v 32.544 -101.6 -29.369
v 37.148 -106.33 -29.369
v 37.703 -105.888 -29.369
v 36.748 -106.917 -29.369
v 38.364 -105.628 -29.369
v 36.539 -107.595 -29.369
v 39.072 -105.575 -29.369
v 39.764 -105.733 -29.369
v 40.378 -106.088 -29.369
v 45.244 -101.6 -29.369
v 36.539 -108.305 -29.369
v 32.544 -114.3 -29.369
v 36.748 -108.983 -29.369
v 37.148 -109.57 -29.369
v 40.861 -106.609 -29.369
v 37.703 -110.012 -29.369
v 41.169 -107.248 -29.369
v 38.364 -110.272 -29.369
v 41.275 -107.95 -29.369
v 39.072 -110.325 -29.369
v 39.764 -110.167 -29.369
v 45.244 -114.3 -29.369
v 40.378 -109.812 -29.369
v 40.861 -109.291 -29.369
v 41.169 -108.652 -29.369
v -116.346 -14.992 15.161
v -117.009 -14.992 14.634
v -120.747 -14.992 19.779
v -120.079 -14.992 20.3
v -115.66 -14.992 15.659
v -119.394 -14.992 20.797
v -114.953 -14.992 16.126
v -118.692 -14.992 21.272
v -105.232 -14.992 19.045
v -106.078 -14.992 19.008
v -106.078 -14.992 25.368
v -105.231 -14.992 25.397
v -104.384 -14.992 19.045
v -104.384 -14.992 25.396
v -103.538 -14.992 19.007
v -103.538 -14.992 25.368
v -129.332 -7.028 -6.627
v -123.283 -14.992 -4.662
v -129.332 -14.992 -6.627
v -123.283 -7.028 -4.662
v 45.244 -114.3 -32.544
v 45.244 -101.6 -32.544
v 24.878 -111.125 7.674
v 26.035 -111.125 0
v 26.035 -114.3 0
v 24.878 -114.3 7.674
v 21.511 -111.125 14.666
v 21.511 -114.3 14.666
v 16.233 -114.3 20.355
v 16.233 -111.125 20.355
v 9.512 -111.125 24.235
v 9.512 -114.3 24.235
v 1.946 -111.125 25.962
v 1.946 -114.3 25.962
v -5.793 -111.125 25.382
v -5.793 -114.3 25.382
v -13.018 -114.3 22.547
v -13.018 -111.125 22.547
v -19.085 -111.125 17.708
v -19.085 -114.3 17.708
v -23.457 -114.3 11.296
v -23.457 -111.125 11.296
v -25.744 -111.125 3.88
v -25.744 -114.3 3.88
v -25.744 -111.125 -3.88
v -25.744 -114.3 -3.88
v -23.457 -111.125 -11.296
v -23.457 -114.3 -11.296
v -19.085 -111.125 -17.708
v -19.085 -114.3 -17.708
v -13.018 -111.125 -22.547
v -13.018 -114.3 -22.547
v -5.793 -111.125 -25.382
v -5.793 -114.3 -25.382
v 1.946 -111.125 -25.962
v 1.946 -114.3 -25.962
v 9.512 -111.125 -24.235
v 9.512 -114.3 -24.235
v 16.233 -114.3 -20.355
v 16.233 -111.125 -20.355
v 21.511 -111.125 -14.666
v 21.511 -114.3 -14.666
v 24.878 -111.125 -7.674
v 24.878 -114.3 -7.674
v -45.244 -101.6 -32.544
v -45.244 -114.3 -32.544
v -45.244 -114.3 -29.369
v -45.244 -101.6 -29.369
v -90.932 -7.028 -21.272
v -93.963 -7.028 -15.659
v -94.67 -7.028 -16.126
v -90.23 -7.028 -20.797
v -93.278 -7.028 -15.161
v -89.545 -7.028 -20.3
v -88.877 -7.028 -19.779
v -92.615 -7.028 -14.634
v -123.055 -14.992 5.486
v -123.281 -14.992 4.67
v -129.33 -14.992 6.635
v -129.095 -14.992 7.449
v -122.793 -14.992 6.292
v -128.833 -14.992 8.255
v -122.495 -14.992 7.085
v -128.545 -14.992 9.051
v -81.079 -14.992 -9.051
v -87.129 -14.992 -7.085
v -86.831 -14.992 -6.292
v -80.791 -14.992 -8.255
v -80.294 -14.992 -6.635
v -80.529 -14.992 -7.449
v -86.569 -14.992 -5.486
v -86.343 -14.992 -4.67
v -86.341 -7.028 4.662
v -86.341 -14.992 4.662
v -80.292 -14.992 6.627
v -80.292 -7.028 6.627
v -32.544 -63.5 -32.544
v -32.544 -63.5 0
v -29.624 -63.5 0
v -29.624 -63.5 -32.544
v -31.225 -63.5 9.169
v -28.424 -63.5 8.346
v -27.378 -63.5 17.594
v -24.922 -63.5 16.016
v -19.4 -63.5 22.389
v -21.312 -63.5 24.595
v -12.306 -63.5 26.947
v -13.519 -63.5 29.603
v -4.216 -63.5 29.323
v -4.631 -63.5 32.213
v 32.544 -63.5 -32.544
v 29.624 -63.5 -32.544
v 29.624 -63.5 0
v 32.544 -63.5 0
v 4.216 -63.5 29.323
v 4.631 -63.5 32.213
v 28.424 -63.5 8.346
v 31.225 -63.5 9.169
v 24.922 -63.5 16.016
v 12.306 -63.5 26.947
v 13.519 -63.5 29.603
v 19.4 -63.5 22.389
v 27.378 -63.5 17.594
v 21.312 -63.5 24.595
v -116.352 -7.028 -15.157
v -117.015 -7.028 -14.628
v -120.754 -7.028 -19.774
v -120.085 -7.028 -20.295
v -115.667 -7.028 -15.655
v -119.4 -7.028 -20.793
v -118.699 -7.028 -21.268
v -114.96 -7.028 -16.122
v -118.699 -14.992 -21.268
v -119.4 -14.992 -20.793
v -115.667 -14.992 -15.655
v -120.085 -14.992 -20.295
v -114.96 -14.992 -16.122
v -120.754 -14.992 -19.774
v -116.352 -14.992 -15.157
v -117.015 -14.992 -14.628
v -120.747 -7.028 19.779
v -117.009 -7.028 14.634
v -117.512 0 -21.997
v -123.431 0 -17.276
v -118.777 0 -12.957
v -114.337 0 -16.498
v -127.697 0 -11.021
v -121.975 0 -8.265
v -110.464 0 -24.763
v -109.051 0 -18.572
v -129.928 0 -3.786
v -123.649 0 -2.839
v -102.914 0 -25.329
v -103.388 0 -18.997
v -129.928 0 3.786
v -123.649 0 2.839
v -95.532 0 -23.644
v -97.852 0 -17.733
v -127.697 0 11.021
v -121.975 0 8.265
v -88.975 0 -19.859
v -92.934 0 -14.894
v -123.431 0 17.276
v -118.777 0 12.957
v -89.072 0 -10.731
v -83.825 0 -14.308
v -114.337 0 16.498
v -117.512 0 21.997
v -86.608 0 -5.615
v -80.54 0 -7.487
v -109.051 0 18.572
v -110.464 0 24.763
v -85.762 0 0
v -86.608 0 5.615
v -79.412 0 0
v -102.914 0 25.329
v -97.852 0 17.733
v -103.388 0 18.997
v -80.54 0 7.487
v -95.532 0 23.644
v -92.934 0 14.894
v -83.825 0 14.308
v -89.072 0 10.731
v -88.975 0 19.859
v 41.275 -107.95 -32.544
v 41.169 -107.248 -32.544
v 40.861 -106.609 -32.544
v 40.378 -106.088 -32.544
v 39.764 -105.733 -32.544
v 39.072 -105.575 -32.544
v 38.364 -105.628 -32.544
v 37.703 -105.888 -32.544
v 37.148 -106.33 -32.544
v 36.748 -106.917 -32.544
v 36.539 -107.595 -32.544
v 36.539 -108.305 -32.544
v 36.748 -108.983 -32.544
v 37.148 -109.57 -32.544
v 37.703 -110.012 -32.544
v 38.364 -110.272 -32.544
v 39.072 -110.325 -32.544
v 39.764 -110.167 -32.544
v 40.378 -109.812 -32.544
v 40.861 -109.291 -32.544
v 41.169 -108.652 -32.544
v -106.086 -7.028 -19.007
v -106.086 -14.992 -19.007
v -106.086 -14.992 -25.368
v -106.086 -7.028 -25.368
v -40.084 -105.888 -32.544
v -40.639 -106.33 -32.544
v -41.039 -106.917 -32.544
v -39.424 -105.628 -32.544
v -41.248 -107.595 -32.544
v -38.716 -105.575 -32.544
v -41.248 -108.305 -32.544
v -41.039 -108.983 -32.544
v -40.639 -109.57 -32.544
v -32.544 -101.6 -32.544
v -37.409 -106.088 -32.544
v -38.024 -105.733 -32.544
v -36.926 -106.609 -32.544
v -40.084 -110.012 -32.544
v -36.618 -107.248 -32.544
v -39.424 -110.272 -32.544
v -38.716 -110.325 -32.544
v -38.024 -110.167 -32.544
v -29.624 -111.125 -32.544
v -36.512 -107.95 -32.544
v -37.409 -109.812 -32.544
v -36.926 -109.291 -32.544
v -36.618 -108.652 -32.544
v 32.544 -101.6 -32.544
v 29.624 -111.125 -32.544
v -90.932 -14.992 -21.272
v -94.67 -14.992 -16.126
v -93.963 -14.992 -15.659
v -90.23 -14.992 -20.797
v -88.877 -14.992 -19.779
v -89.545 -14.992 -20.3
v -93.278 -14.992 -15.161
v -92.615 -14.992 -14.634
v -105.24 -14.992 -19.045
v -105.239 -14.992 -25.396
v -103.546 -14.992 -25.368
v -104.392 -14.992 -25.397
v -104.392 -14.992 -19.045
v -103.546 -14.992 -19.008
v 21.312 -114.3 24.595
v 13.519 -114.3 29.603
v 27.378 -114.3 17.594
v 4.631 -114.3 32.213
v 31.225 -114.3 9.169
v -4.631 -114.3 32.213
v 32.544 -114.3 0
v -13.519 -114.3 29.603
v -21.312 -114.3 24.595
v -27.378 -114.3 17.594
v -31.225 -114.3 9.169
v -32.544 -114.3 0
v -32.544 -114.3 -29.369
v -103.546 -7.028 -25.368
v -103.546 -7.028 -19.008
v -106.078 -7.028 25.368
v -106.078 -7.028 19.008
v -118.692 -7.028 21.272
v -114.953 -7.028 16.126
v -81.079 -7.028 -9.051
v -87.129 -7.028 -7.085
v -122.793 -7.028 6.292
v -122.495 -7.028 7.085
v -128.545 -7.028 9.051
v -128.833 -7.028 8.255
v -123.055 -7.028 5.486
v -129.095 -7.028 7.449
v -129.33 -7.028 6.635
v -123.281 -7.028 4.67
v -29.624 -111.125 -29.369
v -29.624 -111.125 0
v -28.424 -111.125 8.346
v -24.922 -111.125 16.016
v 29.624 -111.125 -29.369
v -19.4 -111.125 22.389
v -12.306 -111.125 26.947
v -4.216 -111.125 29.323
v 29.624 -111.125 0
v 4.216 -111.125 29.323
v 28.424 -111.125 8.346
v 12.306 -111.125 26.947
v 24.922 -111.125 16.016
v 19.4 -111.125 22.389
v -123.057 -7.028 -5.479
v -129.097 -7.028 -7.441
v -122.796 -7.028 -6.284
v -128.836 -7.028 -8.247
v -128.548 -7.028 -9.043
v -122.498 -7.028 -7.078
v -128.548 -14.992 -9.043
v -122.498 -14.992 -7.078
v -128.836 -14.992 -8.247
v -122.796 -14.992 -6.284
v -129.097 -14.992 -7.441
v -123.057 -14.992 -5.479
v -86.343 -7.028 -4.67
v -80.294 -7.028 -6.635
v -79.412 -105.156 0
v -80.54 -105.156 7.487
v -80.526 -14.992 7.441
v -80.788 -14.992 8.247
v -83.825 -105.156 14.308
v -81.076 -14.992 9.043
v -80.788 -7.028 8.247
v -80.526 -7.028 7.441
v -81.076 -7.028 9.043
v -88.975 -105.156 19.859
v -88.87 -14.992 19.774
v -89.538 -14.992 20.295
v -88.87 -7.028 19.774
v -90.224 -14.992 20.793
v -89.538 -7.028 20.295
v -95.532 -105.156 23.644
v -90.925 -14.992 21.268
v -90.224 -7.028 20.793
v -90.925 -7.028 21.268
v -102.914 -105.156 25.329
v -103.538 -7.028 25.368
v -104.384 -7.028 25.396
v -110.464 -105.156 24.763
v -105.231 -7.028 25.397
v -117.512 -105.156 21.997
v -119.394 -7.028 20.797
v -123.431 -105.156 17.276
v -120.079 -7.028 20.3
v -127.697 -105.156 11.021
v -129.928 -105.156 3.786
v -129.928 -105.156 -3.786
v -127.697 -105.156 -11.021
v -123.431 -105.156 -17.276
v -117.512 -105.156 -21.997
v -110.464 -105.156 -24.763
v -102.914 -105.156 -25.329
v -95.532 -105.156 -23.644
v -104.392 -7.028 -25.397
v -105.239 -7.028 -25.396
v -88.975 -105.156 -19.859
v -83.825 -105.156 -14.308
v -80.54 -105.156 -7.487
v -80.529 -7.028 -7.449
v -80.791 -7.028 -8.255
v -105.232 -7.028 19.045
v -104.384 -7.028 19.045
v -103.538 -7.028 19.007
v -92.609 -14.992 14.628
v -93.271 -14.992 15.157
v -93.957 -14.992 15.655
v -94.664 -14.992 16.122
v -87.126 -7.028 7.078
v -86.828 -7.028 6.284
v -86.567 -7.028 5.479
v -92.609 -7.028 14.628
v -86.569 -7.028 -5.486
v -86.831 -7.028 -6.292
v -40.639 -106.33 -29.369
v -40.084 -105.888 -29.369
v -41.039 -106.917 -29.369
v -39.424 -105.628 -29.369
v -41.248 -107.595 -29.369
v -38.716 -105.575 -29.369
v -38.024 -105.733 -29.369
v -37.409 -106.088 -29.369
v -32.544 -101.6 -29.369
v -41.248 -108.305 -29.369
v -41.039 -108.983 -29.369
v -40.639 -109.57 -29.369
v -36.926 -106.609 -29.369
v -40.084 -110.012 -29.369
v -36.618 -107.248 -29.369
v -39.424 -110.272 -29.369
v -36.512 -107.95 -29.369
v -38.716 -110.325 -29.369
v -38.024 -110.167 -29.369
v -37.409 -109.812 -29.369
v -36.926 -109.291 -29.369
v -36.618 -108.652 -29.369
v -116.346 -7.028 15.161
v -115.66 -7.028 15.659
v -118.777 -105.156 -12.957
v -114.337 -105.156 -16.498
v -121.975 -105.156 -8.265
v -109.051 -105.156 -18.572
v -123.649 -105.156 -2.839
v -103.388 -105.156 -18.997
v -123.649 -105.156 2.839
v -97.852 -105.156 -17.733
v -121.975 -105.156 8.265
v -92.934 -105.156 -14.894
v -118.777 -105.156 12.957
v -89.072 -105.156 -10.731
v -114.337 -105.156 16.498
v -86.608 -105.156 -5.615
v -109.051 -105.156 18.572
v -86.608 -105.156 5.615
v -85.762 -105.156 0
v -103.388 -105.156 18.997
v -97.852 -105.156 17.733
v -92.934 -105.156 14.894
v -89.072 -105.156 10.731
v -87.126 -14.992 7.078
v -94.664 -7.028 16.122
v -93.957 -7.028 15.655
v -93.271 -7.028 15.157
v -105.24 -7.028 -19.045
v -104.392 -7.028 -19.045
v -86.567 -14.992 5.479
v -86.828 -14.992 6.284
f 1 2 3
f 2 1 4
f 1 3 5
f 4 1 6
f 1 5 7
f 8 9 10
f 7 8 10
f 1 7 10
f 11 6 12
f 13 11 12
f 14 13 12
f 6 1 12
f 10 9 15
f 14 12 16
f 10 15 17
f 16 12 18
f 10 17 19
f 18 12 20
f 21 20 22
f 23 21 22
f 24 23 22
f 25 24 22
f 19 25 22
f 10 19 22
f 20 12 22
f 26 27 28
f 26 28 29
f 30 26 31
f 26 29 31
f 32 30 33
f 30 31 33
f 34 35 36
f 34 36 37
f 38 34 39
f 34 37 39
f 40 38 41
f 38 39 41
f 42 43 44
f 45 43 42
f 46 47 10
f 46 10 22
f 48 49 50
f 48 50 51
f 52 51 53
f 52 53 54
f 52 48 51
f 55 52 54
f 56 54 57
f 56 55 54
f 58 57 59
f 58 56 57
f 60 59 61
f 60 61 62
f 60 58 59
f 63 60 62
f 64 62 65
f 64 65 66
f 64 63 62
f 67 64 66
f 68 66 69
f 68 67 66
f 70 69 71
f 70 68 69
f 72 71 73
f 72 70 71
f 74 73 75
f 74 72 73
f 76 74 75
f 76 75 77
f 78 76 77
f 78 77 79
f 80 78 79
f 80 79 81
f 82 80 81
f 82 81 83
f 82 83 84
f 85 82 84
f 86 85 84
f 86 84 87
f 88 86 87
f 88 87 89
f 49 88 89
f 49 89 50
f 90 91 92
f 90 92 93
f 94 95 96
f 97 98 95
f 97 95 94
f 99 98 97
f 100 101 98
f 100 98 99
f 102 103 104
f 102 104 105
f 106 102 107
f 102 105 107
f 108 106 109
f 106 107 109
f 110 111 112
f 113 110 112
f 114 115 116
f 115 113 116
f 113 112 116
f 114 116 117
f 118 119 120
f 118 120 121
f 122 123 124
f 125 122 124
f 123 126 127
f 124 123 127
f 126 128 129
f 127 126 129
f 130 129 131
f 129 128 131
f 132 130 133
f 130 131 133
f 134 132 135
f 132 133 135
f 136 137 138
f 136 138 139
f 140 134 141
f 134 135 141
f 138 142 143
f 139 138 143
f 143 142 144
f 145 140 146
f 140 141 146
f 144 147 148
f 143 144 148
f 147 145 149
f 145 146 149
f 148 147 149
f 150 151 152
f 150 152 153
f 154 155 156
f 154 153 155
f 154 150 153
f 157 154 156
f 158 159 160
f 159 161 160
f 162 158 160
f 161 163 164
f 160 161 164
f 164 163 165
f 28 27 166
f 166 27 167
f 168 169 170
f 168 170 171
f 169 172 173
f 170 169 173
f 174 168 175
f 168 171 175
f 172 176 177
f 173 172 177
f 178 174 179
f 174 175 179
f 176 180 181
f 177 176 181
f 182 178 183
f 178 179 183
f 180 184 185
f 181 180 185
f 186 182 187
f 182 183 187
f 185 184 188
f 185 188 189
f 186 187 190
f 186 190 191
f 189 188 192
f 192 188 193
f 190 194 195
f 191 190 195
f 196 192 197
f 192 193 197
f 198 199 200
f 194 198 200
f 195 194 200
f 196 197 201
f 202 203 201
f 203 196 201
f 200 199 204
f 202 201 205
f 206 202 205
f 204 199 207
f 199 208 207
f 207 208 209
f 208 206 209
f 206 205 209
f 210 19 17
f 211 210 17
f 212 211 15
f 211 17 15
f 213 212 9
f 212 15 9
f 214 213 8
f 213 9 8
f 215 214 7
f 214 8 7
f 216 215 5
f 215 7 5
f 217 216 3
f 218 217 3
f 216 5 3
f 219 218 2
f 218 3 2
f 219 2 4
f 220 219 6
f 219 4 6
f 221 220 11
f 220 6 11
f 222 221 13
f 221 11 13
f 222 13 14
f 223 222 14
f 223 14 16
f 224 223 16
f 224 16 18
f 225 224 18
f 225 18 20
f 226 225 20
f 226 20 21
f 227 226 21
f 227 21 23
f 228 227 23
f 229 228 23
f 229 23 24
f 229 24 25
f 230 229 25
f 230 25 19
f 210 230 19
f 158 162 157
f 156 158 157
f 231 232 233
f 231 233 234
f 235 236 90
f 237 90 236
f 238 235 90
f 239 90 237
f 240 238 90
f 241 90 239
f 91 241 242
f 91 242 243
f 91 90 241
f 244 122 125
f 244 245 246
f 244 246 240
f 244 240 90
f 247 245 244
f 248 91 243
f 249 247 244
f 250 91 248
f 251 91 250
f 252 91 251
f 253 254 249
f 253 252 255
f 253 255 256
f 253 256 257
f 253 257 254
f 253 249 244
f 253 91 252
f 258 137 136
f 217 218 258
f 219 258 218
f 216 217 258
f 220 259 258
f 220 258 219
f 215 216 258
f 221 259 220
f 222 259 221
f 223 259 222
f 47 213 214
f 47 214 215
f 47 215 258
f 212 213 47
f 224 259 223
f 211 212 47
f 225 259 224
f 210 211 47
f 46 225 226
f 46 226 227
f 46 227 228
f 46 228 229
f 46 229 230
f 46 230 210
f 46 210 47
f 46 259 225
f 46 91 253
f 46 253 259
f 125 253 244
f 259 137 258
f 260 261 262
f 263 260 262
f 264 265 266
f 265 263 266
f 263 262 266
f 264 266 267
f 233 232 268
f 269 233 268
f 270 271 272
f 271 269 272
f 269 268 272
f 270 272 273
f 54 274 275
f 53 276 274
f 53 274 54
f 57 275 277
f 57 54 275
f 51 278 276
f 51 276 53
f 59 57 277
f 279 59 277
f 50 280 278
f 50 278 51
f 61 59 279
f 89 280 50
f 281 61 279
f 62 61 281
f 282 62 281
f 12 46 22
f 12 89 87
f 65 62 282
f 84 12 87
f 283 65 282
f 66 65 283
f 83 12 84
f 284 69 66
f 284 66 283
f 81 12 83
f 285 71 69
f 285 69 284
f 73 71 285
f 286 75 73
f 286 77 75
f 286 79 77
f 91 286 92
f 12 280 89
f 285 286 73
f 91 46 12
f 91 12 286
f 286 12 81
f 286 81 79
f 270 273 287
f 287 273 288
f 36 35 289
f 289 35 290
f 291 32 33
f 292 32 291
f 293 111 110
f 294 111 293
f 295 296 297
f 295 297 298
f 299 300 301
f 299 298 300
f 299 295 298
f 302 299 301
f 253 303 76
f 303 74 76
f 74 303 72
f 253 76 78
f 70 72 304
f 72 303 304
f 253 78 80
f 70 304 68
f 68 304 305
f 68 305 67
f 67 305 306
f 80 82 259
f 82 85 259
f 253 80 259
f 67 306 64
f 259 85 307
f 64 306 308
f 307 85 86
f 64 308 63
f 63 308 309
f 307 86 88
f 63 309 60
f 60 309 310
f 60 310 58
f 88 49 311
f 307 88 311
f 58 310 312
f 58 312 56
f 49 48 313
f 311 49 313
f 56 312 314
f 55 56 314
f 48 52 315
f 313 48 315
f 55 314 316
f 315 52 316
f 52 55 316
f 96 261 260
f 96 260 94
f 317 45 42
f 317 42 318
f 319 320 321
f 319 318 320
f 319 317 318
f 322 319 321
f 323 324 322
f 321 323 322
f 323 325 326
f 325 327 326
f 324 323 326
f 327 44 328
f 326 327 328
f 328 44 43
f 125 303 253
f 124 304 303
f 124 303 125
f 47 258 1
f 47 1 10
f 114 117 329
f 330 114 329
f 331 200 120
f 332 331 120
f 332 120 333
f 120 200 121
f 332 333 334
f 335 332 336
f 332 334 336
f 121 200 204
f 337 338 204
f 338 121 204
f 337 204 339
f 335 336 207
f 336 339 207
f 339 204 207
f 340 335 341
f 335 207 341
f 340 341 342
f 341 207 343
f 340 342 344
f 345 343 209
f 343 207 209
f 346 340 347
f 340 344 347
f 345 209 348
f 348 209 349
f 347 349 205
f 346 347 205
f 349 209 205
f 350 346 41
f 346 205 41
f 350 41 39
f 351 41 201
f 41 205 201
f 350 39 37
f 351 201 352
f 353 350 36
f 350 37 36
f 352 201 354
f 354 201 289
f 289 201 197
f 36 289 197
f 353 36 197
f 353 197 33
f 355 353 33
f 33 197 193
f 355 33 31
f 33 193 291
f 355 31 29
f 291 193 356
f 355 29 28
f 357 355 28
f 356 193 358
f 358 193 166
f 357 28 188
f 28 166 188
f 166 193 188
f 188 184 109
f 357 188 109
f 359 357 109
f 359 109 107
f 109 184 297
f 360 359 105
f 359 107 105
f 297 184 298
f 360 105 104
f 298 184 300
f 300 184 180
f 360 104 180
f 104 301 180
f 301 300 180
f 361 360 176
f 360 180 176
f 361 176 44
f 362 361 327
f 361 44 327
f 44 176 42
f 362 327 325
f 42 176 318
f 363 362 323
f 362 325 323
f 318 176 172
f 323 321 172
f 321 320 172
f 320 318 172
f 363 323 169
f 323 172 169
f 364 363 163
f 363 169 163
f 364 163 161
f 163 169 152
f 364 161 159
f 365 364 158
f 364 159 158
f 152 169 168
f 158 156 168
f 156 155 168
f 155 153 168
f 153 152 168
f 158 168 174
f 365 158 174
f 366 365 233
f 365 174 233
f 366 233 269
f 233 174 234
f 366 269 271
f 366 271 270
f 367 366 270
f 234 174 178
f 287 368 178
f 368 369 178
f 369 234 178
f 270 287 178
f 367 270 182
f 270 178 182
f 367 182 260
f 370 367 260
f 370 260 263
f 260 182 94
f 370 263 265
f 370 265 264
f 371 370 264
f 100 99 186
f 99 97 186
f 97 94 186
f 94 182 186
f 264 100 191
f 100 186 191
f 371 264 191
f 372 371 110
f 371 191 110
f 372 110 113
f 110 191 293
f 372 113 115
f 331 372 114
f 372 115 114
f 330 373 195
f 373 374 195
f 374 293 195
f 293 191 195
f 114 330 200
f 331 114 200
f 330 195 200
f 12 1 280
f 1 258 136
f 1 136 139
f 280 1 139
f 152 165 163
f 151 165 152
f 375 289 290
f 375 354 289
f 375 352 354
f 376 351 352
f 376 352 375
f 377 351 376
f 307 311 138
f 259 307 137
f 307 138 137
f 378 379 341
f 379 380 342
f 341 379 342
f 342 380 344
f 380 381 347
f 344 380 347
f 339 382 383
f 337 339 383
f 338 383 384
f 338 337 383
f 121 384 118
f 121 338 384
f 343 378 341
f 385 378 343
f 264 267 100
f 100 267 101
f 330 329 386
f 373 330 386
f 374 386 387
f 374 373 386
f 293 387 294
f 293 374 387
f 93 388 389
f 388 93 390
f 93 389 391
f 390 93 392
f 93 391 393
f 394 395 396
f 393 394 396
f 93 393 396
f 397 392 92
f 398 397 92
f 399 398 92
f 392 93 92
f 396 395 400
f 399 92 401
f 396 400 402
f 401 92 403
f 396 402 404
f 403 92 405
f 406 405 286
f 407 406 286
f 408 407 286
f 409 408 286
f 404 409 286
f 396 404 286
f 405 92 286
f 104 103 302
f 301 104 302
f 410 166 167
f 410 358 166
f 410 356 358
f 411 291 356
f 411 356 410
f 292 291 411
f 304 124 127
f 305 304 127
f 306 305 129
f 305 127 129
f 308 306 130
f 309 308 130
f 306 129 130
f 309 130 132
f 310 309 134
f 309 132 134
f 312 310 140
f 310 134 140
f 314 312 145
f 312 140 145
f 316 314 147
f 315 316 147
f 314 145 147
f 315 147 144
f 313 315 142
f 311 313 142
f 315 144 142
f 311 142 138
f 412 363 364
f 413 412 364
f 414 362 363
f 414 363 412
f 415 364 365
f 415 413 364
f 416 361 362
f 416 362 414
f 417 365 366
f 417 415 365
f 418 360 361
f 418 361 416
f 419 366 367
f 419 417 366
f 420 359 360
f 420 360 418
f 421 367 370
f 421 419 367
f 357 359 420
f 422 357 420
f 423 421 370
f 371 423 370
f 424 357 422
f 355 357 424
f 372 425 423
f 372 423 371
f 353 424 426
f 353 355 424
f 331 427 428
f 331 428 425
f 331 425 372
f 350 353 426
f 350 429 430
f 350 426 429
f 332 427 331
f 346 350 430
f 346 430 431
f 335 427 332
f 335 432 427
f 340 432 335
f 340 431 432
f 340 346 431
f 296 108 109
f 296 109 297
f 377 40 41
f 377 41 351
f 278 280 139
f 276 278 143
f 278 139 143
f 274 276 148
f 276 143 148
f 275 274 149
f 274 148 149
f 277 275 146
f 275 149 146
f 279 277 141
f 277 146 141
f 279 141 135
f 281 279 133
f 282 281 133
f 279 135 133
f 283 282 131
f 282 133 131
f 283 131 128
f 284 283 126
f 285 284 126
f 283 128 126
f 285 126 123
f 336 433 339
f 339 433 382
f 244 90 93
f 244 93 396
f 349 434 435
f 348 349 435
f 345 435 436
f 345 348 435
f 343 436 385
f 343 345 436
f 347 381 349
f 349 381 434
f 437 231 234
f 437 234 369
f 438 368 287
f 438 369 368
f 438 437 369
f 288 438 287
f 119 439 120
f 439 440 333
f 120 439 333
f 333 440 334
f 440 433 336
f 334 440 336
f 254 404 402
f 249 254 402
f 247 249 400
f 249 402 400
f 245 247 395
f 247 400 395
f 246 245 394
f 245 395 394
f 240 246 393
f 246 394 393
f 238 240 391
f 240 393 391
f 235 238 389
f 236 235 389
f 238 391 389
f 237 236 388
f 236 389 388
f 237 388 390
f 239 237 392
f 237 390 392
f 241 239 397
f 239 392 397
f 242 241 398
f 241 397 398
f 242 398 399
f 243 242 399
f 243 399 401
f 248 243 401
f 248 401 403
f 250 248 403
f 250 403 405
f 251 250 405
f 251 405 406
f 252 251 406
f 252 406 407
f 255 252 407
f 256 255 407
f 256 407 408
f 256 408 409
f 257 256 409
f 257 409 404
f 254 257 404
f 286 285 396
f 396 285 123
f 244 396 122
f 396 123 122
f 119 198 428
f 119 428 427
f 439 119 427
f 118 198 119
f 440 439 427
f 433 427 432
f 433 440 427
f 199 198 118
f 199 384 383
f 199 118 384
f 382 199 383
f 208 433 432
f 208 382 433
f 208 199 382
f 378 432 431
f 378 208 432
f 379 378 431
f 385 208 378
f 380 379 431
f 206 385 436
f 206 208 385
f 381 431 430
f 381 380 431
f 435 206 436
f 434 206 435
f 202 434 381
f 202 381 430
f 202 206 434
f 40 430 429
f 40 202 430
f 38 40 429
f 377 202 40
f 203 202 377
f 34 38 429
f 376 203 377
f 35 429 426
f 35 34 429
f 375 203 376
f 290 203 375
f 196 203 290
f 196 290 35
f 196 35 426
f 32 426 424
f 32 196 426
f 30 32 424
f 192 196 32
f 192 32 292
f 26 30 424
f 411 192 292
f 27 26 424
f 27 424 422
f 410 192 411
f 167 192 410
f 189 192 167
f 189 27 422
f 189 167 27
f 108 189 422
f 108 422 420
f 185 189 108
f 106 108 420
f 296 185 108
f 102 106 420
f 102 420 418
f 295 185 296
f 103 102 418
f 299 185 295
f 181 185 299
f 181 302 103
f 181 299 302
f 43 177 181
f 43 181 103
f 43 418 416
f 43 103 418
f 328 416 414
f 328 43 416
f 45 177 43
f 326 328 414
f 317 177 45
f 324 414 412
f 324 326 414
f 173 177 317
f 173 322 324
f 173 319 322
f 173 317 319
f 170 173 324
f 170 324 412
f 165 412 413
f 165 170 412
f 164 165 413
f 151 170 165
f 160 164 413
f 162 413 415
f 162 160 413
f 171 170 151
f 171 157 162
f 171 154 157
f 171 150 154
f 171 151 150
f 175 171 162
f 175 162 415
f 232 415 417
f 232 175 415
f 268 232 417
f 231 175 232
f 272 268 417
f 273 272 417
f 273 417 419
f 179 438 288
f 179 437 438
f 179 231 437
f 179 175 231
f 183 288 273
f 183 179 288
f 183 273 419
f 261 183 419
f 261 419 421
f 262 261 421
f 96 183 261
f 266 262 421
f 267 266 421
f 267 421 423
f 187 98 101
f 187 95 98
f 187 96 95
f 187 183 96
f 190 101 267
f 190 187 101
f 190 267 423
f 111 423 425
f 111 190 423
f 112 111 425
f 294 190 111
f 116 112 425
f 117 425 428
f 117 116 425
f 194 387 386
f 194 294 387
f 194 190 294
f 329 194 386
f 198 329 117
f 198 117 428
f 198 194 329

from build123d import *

# Parameters (mm, degrees)
F0_R           = 26.035
F1_DEPTH       = 114.3
F2_R           = 29.6242543491
F3_DEPTH       = 111.125
F5_DEPTH       = 111.125
F7_DEPTH       = 3.175
F8_W           = 12.7
F8_H           = 12.7
F9_DEPTH       = 3.175
F10_R          = 2.38125
F11_DEPTH      = 25.4
F12_R          = 25.4
F12_R_2        = 19.05
F13_DEPTH      = 105.156
F14_W          = 2.54
F14_H          = 7.9642278678
F15_DEPTH      = 32.766
F16_COUNT      = 10
F17_W          = 59.2485086981
F17_H          = 9.525
F18_DEPTH      = 25.4
F19_W          = 132.8420794986
F19_H          = 63.5
F20_DEPTH      = 65.278
F20_DEPTH_BACK = 64.77


with BuildPart() as f1:
    # F0 (on Front) → F1 (new body)
    with BuildSketch(Plane.XZ):
        with BuildLine():
            Line((-32.54375, -32.54375), (0, -32.54375))
            Line((0, -32.54375), (32.54375, -32.54375))
            Line((32.54375, -32.54375), (32.54375, 0))
            ThreePointArc((32.54375, 0), (0, 32.54375), (-32.54375, 0))
            Line((-32.54375, 0), (-32.54375, -32.54375))
        make_face()
        Circle(F0_R, mode=Mode.SUBTRACT)
    extrude(amount=F1_DEPTH)

    # F2 (on face) → F3 (cut)
    with BuildSketch(Plane(origin=(0, 0, 0), x_dir=(-1, 0, 0), z_dir=(0, 1, 0))):
        Circle(F2_R)
    extrude(amount=-F3_DEPTH, mode=Mode.SUBTRACT)

    # F4 (on face) → F5 (cut)
    with BuildSketch(Plane(origin=(0, 0, 0), x_dir=(-1, 0, 0), z_dir=(0, 1, 0))):
        Polygon((-29.6242543491, -49.9954782426), (0, -49.9954782426), (29.6242543491, -49.9954782426), (29.6242543491, 0), (0, 0), (-29.6242543491, 0), align=None)
    extrude(amount=-F5_DEPTH, mode=Mode.SUBTRACT)

    # F6 (on face) → F7 (join)
    with BuildSketch(Plane(origin=(0, 0, -32.54375), x_dir=(1, 0, 0), z_dir=(0, 0, -1))):
        Polygon((45.24375, 114.3), (0, 114.3), (-45.24375, 114.3), (-45.24375, 101.6), (-32.54375, 101.6), (0, 101.6), (32.54375, 101.6), (45.24375, 101.6), align=None)
    extrude(amount=-F7_DEPTH)

    # F8 (on face) → F9 (join)
    with BuildSketch(Plane(origin=(0, 0, -32.54375), x_dir=(1, 0, 0), z_dir=(0, 0, -1))):
        with Locations((-38.89375, 57.15)):
            Rectangle(F8_W, F8_H)
        with Locations((38.89375, 57.15)):
            Rectangle(F8_W, F8_H)
    extrude(amount=-F9_DEPTH)

    # F10 (on face) → F11 (cut)
    with BuildSketch(Plane.XY.offset(-29.36875)):
        with Locations((-38.89375, -57.15)):
            Circle(F10_R)
        with Locations((-38.89375, -107.95)):
            Circle(F10_R)
        with Locations((38.89375, -57.15)):
            Circle(F10_R)
        with Locations((38.8937518001, -107.95)):
            Circle(F10_R)
    extrude(amount=-F11_DEPTH, mode=Mode.SUBTRACT)

    # F17 (on face) → F18 (cut)
    with BuildSketch(Plane.XY.offset(-29.36875)):
        with Locations((0, -106.3625)):
            Rectangle(F17_W, F17_H)
    extrude(amount=-F18_DEPTH, mode=Mode.SUBTRACT)

    # F19 (on Top) → F20 (cut, two sides)
    with BuildSketch(Plane.XY) as f20_sk:
        with Locations((4.5964045951, -31.75)):
            Rectangle(F19_W, F19_H)
    extrude(amount=-F20_DEPTH, mode=Mode.SUBTRACT)
    extrude(f20_sk.sketch, amount=F20_DEPTH_BACK, mode=Mode.SUBTRACT)


with BuildPart() as f13:
    # F12 (on Front) → F13 (new body)
    with BuildSketch(Plane.XZ):
        with Locations((-104.8119291663, 0)):
            Circle(F12_R)
        with Locations((-104.8119291663, 0)):
            Circle(F12_R_2, mode=Mode.SUBTRACT)
    extrude(amount=F13_DEPTH)


with BuildPart() as f15:
    # F14 (on Top) → F15 (new body)
    with BuildSketch(Plane.XY):
        with Locations((-104.8159544325, -11.0098046448)):
            Rectangle(F14_W, F14_H)
    extrude(amount=-F15_DEPTH)


with BuildPart() as f16_tool:
    # F16: F15 ×10 about axis
    f16_axis = Axis((-104.8119291663, 0, 0), (0, -1, 0))
    for i in range(1, F16_COUNT):
        add(f15.part.rotate(f16_axis, i * 360 / F16_COUNT))


with BuildPart() as f13_1:
    add(f13.part)

    # F16: cut by f16_tool
    add(f16_tool.part, mode=Mode.SUBTRACT)


with BuildPart() as f15_1:
    add(f15.part)

    # F16: cut by f16_tool
    add(f16_tool.part, mode=Mode.SUBTRACT)


with BuildPart() as f13_2:
    add(f13_1.part)

    # F16#seed: cut F15
    add(f15_1.part, mode=Mode.SUBTRACT)


solid = Compound([f1.part, f13_2.part])
